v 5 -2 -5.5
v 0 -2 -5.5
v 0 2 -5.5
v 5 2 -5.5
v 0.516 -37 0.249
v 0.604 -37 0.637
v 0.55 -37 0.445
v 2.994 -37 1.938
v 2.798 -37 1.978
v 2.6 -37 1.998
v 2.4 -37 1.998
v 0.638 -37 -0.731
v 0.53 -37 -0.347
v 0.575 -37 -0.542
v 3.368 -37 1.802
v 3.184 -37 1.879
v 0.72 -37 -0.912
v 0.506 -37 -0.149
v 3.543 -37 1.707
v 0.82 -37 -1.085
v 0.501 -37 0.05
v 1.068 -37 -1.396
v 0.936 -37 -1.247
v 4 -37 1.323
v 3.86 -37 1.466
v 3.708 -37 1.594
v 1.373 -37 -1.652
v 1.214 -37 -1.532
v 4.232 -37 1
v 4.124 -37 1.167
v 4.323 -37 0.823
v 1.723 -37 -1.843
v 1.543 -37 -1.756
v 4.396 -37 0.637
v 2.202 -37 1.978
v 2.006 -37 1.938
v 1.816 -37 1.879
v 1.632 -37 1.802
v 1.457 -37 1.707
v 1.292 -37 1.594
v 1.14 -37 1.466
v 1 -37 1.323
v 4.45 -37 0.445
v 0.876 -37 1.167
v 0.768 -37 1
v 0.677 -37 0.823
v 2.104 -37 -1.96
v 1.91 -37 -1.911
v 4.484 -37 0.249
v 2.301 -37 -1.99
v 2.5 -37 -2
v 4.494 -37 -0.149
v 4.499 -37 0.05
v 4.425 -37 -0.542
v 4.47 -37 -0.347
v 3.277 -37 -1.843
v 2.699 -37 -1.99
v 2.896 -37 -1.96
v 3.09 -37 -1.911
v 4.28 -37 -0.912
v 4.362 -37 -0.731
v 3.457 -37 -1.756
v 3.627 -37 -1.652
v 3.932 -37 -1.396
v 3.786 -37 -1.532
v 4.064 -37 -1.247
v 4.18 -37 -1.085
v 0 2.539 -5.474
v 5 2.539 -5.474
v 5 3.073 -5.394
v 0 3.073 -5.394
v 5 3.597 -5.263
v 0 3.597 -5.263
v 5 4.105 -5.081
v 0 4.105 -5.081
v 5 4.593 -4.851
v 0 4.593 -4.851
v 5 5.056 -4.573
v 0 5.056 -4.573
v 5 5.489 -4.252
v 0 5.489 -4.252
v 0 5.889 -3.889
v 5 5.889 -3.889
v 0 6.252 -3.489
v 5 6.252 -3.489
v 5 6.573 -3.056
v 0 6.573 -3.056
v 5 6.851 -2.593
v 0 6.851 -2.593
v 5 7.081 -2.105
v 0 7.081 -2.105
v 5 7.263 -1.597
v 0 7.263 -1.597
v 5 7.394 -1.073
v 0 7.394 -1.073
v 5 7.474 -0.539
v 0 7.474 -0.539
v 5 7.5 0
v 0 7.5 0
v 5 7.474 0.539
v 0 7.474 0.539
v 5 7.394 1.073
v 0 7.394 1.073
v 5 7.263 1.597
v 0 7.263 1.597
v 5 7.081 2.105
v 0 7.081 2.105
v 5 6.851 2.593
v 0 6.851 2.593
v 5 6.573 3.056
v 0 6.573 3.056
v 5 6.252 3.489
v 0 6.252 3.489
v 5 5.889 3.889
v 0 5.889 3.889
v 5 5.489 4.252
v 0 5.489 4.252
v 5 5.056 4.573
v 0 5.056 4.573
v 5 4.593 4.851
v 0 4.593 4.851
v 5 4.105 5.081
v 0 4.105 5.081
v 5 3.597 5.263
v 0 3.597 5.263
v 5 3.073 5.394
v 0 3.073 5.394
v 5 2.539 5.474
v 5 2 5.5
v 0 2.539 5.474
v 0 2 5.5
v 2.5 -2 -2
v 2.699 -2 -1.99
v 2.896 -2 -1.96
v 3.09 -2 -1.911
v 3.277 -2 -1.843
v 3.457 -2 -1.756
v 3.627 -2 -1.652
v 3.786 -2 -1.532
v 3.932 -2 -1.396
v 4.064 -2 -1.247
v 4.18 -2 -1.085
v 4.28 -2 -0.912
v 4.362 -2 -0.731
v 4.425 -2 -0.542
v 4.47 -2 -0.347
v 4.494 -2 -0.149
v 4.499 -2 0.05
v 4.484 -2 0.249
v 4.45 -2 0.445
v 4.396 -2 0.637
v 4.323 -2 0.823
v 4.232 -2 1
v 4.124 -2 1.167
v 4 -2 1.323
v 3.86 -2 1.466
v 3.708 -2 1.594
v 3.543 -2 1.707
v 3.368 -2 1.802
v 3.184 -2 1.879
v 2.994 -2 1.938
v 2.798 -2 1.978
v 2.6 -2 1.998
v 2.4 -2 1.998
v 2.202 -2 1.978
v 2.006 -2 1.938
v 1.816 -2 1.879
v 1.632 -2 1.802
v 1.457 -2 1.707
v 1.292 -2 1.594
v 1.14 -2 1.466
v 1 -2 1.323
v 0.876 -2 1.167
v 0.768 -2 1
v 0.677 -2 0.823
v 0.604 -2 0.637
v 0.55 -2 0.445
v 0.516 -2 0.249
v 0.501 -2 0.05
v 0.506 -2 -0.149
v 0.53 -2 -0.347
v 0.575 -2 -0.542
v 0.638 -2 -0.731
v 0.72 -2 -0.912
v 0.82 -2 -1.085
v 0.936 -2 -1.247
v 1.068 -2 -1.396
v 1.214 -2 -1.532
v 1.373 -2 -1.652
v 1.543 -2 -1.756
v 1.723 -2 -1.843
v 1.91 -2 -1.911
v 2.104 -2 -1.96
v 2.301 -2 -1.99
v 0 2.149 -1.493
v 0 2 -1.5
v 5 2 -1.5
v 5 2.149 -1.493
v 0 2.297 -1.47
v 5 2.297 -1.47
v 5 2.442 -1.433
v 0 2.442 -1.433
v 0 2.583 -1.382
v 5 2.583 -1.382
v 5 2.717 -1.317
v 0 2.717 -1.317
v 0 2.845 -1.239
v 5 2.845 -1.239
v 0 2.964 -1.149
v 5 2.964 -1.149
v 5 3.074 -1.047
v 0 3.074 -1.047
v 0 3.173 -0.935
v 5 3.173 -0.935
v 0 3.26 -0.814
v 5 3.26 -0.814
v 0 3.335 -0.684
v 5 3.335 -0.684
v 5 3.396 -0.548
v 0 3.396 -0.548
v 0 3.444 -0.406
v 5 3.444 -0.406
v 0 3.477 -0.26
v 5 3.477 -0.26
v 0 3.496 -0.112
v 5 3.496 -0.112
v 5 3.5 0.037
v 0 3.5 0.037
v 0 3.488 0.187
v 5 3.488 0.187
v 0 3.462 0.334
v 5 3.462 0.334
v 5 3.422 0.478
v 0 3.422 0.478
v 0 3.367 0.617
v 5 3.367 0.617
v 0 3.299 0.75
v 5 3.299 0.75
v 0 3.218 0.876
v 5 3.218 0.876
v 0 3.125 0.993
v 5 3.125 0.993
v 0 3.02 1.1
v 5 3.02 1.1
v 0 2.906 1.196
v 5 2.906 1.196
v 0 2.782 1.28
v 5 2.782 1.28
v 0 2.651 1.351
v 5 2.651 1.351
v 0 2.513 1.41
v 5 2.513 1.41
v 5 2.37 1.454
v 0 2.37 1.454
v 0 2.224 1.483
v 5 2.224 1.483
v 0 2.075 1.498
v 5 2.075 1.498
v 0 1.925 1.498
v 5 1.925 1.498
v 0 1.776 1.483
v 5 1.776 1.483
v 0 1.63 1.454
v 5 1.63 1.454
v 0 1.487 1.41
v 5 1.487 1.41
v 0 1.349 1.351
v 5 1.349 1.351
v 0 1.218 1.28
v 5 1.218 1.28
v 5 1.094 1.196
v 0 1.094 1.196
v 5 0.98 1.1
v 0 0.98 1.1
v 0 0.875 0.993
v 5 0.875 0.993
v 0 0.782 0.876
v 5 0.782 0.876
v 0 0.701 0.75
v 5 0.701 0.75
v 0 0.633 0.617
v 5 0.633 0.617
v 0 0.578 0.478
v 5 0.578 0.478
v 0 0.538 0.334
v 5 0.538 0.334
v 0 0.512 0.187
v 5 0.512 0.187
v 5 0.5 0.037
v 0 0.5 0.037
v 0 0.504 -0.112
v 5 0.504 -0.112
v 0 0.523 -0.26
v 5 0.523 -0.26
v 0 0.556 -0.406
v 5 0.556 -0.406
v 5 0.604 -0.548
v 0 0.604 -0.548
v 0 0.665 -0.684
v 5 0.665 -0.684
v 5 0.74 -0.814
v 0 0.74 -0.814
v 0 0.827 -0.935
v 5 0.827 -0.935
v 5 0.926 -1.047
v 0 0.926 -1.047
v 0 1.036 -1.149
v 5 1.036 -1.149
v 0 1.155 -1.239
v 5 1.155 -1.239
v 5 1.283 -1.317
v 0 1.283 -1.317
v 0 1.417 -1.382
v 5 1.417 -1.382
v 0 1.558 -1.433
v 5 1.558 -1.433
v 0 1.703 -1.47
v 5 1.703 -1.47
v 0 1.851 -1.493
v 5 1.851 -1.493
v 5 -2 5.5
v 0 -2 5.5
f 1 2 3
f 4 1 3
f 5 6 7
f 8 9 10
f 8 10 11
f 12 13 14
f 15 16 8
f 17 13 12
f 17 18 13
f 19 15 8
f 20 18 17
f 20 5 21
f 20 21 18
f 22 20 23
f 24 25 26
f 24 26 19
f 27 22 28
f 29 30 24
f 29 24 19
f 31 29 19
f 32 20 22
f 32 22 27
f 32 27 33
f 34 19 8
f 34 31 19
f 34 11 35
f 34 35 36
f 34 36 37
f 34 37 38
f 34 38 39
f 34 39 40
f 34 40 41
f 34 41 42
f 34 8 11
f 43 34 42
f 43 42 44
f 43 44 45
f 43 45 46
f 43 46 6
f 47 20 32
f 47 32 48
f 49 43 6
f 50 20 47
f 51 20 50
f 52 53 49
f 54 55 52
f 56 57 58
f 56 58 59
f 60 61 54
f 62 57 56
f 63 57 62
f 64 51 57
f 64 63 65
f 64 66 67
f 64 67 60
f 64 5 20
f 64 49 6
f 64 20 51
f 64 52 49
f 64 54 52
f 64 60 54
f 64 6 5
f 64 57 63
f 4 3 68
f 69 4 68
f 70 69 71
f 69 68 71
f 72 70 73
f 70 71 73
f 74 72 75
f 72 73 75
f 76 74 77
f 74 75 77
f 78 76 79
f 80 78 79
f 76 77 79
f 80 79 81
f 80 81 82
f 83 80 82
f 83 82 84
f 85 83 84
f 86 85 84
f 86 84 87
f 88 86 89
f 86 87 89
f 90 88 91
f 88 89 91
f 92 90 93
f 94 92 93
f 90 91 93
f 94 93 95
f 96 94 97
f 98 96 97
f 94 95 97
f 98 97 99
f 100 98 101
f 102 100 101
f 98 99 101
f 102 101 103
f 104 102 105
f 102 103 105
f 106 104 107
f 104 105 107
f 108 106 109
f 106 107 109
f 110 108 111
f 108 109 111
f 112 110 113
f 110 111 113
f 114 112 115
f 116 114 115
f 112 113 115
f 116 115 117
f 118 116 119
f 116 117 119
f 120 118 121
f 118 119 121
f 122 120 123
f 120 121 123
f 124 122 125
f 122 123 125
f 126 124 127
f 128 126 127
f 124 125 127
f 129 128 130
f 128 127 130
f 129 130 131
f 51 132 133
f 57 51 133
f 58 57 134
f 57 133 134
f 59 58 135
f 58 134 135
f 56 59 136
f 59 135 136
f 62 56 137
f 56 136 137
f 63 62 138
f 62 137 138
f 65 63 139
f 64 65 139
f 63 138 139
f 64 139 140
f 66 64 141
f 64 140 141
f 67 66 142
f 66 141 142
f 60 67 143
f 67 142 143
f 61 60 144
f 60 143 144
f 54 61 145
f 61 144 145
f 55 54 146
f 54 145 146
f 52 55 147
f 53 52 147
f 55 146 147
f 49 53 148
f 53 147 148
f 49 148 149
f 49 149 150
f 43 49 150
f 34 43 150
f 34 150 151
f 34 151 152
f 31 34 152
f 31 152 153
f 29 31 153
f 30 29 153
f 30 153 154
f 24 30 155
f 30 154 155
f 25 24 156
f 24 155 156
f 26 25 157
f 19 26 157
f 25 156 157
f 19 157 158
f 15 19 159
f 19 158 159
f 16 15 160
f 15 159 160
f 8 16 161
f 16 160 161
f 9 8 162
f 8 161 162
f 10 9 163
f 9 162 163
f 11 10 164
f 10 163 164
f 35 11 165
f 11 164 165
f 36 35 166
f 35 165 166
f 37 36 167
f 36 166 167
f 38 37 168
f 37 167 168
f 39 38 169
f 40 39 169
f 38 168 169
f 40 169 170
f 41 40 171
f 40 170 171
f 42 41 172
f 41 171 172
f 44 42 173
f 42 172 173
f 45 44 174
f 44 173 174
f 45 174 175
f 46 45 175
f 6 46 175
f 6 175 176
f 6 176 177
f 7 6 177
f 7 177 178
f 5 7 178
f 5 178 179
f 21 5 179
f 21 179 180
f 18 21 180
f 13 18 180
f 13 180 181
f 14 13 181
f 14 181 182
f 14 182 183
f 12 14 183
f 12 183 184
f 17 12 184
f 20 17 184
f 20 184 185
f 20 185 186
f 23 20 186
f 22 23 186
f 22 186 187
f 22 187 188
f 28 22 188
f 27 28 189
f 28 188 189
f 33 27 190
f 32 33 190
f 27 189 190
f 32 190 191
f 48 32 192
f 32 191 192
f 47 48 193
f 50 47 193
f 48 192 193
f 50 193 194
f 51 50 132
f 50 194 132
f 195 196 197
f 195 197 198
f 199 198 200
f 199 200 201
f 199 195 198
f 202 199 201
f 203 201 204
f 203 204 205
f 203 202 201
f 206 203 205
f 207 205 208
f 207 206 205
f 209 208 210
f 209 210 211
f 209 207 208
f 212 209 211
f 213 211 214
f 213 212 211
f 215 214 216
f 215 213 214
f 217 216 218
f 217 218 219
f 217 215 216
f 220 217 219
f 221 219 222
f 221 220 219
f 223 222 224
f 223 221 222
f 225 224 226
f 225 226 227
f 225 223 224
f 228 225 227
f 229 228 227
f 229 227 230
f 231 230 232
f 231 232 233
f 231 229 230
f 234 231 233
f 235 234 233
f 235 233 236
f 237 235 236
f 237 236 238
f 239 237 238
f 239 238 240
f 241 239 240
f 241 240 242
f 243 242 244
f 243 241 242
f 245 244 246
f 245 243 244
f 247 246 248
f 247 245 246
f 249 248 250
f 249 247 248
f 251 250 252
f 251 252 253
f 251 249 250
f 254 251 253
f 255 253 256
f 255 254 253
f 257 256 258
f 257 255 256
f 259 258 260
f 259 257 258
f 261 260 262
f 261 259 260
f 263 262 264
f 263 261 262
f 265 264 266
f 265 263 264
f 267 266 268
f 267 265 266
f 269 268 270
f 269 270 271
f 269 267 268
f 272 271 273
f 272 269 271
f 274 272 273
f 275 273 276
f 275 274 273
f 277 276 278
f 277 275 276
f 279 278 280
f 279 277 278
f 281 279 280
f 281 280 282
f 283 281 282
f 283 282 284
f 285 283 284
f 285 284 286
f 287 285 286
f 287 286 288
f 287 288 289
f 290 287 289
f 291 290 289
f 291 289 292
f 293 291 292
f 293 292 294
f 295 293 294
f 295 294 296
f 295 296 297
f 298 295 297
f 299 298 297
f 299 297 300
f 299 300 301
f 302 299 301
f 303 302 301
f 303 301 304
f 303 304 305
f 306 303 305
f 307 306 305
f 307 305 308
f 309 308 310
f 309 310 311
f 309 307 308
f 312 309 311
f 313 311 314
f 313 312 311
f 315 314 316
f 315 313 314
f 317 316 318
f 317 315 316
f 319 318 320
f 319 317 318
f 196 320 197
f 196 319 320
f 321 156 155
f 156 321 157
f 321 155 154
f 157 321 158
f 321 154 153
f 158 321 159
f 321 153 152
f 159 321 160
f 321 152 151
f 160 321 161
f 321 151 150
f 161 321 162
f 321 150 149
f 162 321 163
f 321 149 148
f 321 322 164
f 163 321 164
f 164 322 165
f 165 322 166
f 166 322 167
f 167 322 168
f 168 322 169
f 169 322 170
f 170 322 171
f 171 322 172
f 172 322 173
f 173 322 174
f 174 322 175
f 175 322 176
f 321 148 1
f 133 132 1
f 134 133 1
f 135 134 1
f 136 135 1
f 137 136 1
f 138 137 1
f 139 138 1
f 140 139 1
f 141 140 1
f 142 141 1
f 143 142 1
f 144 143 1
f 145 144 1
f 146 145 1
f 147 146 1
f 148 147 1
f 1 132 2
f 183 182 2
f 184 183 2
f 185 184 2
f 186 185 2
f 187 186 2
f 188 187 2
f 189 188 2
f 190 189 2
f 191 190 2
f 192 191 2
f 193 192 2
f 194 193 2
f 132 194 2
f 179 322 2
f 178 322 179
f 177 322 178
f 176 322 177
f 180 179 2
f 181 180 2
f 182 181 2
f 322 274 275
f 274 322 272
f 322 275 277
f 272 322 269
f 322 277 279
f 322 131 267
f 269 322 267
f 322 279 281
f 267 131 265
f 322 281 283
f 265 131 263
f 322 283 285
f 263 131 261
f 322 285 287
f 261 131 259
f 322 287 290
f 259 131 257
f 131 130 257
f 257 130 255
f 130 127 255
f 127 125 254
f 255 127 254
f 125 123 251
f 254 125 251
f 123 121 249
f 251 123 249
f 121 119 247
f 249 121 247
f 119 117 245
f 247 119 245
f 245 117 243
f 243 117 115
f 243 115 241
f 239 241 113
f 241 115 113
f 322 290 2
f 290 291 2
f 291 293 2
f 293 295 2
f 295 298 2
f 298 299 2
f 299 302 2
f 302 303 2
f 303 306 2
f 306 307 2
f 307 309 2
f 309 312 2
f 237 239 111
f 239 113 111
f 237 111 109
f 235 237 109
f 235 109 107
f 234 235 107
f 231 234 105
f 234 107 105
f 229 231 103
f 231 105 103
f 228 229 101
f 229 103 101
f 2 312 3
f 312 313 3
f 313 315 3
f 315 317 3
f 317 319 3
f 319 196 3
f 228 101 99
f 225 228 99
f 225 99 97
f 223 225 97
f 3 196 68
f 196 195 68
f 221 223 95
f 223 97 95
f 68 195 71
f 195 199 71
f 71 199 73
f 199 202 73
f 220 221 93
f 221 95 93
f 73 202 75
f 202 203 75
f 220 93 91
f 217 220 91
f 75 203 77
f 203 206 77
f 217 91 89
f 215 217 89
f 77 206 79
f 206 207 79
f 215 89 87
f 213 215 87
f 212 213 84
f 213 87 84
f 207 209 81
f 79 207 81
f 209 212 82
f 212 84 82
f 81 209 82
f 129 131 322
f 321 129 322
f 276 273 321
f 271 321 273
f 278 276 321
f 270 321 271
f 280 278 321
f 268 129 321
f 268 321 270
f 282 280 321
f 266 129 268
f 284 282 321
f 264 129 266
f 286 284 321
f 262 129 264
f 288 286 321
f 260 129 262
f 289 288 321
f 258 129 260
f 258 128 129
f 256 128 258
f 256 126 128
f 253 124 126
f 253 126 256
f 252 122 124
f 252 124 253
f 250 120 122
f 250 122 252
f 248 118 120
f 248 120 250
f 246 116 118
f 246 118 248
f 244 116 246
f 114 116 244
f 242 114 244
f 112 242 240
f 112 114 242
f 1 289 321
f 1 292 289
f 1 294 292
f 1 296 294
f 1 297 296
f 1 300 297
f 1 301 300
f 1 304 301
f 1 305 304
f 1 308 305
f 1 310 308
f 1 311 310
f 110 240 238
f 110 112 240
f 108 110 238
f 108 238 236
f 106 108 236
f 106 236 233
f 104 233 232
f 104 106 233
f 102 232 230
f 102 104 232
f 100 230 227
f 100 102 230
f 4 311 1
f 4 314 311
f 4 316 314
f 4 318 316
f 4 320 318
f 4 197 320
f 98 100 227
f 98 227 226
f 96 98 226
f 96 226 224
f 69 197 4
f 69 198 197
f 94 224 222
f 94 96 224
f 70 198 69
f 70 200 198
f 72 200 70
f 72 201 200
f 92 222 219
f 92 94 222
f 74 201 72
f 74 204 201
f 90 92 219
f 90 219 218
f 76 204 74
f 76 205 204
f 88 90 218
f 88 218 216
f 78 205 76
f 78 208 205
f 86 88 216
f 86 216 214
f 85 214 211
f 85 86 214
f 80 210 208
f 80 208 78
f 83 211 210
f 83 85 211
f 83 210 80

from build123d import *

# Parameters (mm, degrees)
SKETCH1_R           = 1.5
BOSS_EXTRUDE1_DEPTH = 5
SKETCH2_R           = 2
BOSS_EXTRUDE2_DEPTH = 35


with BuildPart() as part:
    # Sketch1 → Boss-Extrude1 (new body)
    with BuildSketch(Plane(origin=(0, 0, 0), x_dir=(0, 0, -1), z_dir=(1, 0, 0))):
        with BuildLine():
            Line((-5.5, 2), (-5.5, -2))
            Line((-5.5, -2), (5.5, -2))
            Line((5.5, -2), (5.5, 2))
            ThreePointArc((5.5, 2), (0, 7.5), (-5.5, 2))
        make_face()
        with Locations((0, 2)):
            Circle(SKETCH1_R, mode=Mode.SUBTRACT)
    extrude(amount=BOSS_EXTRUDE1_DEPTH)

    # Sketch2 → Boss-Extrude2 (add)
    with BuildSketch(Plane.XZ.offset(2)):
        with Locations(Location((2.5, 0, 0), (0, 0, 270))):
            Circle(SKETCH2_R)
    extrude(amount=BOSS_EXTRUDE2_DEPTH)


solid = part.part
